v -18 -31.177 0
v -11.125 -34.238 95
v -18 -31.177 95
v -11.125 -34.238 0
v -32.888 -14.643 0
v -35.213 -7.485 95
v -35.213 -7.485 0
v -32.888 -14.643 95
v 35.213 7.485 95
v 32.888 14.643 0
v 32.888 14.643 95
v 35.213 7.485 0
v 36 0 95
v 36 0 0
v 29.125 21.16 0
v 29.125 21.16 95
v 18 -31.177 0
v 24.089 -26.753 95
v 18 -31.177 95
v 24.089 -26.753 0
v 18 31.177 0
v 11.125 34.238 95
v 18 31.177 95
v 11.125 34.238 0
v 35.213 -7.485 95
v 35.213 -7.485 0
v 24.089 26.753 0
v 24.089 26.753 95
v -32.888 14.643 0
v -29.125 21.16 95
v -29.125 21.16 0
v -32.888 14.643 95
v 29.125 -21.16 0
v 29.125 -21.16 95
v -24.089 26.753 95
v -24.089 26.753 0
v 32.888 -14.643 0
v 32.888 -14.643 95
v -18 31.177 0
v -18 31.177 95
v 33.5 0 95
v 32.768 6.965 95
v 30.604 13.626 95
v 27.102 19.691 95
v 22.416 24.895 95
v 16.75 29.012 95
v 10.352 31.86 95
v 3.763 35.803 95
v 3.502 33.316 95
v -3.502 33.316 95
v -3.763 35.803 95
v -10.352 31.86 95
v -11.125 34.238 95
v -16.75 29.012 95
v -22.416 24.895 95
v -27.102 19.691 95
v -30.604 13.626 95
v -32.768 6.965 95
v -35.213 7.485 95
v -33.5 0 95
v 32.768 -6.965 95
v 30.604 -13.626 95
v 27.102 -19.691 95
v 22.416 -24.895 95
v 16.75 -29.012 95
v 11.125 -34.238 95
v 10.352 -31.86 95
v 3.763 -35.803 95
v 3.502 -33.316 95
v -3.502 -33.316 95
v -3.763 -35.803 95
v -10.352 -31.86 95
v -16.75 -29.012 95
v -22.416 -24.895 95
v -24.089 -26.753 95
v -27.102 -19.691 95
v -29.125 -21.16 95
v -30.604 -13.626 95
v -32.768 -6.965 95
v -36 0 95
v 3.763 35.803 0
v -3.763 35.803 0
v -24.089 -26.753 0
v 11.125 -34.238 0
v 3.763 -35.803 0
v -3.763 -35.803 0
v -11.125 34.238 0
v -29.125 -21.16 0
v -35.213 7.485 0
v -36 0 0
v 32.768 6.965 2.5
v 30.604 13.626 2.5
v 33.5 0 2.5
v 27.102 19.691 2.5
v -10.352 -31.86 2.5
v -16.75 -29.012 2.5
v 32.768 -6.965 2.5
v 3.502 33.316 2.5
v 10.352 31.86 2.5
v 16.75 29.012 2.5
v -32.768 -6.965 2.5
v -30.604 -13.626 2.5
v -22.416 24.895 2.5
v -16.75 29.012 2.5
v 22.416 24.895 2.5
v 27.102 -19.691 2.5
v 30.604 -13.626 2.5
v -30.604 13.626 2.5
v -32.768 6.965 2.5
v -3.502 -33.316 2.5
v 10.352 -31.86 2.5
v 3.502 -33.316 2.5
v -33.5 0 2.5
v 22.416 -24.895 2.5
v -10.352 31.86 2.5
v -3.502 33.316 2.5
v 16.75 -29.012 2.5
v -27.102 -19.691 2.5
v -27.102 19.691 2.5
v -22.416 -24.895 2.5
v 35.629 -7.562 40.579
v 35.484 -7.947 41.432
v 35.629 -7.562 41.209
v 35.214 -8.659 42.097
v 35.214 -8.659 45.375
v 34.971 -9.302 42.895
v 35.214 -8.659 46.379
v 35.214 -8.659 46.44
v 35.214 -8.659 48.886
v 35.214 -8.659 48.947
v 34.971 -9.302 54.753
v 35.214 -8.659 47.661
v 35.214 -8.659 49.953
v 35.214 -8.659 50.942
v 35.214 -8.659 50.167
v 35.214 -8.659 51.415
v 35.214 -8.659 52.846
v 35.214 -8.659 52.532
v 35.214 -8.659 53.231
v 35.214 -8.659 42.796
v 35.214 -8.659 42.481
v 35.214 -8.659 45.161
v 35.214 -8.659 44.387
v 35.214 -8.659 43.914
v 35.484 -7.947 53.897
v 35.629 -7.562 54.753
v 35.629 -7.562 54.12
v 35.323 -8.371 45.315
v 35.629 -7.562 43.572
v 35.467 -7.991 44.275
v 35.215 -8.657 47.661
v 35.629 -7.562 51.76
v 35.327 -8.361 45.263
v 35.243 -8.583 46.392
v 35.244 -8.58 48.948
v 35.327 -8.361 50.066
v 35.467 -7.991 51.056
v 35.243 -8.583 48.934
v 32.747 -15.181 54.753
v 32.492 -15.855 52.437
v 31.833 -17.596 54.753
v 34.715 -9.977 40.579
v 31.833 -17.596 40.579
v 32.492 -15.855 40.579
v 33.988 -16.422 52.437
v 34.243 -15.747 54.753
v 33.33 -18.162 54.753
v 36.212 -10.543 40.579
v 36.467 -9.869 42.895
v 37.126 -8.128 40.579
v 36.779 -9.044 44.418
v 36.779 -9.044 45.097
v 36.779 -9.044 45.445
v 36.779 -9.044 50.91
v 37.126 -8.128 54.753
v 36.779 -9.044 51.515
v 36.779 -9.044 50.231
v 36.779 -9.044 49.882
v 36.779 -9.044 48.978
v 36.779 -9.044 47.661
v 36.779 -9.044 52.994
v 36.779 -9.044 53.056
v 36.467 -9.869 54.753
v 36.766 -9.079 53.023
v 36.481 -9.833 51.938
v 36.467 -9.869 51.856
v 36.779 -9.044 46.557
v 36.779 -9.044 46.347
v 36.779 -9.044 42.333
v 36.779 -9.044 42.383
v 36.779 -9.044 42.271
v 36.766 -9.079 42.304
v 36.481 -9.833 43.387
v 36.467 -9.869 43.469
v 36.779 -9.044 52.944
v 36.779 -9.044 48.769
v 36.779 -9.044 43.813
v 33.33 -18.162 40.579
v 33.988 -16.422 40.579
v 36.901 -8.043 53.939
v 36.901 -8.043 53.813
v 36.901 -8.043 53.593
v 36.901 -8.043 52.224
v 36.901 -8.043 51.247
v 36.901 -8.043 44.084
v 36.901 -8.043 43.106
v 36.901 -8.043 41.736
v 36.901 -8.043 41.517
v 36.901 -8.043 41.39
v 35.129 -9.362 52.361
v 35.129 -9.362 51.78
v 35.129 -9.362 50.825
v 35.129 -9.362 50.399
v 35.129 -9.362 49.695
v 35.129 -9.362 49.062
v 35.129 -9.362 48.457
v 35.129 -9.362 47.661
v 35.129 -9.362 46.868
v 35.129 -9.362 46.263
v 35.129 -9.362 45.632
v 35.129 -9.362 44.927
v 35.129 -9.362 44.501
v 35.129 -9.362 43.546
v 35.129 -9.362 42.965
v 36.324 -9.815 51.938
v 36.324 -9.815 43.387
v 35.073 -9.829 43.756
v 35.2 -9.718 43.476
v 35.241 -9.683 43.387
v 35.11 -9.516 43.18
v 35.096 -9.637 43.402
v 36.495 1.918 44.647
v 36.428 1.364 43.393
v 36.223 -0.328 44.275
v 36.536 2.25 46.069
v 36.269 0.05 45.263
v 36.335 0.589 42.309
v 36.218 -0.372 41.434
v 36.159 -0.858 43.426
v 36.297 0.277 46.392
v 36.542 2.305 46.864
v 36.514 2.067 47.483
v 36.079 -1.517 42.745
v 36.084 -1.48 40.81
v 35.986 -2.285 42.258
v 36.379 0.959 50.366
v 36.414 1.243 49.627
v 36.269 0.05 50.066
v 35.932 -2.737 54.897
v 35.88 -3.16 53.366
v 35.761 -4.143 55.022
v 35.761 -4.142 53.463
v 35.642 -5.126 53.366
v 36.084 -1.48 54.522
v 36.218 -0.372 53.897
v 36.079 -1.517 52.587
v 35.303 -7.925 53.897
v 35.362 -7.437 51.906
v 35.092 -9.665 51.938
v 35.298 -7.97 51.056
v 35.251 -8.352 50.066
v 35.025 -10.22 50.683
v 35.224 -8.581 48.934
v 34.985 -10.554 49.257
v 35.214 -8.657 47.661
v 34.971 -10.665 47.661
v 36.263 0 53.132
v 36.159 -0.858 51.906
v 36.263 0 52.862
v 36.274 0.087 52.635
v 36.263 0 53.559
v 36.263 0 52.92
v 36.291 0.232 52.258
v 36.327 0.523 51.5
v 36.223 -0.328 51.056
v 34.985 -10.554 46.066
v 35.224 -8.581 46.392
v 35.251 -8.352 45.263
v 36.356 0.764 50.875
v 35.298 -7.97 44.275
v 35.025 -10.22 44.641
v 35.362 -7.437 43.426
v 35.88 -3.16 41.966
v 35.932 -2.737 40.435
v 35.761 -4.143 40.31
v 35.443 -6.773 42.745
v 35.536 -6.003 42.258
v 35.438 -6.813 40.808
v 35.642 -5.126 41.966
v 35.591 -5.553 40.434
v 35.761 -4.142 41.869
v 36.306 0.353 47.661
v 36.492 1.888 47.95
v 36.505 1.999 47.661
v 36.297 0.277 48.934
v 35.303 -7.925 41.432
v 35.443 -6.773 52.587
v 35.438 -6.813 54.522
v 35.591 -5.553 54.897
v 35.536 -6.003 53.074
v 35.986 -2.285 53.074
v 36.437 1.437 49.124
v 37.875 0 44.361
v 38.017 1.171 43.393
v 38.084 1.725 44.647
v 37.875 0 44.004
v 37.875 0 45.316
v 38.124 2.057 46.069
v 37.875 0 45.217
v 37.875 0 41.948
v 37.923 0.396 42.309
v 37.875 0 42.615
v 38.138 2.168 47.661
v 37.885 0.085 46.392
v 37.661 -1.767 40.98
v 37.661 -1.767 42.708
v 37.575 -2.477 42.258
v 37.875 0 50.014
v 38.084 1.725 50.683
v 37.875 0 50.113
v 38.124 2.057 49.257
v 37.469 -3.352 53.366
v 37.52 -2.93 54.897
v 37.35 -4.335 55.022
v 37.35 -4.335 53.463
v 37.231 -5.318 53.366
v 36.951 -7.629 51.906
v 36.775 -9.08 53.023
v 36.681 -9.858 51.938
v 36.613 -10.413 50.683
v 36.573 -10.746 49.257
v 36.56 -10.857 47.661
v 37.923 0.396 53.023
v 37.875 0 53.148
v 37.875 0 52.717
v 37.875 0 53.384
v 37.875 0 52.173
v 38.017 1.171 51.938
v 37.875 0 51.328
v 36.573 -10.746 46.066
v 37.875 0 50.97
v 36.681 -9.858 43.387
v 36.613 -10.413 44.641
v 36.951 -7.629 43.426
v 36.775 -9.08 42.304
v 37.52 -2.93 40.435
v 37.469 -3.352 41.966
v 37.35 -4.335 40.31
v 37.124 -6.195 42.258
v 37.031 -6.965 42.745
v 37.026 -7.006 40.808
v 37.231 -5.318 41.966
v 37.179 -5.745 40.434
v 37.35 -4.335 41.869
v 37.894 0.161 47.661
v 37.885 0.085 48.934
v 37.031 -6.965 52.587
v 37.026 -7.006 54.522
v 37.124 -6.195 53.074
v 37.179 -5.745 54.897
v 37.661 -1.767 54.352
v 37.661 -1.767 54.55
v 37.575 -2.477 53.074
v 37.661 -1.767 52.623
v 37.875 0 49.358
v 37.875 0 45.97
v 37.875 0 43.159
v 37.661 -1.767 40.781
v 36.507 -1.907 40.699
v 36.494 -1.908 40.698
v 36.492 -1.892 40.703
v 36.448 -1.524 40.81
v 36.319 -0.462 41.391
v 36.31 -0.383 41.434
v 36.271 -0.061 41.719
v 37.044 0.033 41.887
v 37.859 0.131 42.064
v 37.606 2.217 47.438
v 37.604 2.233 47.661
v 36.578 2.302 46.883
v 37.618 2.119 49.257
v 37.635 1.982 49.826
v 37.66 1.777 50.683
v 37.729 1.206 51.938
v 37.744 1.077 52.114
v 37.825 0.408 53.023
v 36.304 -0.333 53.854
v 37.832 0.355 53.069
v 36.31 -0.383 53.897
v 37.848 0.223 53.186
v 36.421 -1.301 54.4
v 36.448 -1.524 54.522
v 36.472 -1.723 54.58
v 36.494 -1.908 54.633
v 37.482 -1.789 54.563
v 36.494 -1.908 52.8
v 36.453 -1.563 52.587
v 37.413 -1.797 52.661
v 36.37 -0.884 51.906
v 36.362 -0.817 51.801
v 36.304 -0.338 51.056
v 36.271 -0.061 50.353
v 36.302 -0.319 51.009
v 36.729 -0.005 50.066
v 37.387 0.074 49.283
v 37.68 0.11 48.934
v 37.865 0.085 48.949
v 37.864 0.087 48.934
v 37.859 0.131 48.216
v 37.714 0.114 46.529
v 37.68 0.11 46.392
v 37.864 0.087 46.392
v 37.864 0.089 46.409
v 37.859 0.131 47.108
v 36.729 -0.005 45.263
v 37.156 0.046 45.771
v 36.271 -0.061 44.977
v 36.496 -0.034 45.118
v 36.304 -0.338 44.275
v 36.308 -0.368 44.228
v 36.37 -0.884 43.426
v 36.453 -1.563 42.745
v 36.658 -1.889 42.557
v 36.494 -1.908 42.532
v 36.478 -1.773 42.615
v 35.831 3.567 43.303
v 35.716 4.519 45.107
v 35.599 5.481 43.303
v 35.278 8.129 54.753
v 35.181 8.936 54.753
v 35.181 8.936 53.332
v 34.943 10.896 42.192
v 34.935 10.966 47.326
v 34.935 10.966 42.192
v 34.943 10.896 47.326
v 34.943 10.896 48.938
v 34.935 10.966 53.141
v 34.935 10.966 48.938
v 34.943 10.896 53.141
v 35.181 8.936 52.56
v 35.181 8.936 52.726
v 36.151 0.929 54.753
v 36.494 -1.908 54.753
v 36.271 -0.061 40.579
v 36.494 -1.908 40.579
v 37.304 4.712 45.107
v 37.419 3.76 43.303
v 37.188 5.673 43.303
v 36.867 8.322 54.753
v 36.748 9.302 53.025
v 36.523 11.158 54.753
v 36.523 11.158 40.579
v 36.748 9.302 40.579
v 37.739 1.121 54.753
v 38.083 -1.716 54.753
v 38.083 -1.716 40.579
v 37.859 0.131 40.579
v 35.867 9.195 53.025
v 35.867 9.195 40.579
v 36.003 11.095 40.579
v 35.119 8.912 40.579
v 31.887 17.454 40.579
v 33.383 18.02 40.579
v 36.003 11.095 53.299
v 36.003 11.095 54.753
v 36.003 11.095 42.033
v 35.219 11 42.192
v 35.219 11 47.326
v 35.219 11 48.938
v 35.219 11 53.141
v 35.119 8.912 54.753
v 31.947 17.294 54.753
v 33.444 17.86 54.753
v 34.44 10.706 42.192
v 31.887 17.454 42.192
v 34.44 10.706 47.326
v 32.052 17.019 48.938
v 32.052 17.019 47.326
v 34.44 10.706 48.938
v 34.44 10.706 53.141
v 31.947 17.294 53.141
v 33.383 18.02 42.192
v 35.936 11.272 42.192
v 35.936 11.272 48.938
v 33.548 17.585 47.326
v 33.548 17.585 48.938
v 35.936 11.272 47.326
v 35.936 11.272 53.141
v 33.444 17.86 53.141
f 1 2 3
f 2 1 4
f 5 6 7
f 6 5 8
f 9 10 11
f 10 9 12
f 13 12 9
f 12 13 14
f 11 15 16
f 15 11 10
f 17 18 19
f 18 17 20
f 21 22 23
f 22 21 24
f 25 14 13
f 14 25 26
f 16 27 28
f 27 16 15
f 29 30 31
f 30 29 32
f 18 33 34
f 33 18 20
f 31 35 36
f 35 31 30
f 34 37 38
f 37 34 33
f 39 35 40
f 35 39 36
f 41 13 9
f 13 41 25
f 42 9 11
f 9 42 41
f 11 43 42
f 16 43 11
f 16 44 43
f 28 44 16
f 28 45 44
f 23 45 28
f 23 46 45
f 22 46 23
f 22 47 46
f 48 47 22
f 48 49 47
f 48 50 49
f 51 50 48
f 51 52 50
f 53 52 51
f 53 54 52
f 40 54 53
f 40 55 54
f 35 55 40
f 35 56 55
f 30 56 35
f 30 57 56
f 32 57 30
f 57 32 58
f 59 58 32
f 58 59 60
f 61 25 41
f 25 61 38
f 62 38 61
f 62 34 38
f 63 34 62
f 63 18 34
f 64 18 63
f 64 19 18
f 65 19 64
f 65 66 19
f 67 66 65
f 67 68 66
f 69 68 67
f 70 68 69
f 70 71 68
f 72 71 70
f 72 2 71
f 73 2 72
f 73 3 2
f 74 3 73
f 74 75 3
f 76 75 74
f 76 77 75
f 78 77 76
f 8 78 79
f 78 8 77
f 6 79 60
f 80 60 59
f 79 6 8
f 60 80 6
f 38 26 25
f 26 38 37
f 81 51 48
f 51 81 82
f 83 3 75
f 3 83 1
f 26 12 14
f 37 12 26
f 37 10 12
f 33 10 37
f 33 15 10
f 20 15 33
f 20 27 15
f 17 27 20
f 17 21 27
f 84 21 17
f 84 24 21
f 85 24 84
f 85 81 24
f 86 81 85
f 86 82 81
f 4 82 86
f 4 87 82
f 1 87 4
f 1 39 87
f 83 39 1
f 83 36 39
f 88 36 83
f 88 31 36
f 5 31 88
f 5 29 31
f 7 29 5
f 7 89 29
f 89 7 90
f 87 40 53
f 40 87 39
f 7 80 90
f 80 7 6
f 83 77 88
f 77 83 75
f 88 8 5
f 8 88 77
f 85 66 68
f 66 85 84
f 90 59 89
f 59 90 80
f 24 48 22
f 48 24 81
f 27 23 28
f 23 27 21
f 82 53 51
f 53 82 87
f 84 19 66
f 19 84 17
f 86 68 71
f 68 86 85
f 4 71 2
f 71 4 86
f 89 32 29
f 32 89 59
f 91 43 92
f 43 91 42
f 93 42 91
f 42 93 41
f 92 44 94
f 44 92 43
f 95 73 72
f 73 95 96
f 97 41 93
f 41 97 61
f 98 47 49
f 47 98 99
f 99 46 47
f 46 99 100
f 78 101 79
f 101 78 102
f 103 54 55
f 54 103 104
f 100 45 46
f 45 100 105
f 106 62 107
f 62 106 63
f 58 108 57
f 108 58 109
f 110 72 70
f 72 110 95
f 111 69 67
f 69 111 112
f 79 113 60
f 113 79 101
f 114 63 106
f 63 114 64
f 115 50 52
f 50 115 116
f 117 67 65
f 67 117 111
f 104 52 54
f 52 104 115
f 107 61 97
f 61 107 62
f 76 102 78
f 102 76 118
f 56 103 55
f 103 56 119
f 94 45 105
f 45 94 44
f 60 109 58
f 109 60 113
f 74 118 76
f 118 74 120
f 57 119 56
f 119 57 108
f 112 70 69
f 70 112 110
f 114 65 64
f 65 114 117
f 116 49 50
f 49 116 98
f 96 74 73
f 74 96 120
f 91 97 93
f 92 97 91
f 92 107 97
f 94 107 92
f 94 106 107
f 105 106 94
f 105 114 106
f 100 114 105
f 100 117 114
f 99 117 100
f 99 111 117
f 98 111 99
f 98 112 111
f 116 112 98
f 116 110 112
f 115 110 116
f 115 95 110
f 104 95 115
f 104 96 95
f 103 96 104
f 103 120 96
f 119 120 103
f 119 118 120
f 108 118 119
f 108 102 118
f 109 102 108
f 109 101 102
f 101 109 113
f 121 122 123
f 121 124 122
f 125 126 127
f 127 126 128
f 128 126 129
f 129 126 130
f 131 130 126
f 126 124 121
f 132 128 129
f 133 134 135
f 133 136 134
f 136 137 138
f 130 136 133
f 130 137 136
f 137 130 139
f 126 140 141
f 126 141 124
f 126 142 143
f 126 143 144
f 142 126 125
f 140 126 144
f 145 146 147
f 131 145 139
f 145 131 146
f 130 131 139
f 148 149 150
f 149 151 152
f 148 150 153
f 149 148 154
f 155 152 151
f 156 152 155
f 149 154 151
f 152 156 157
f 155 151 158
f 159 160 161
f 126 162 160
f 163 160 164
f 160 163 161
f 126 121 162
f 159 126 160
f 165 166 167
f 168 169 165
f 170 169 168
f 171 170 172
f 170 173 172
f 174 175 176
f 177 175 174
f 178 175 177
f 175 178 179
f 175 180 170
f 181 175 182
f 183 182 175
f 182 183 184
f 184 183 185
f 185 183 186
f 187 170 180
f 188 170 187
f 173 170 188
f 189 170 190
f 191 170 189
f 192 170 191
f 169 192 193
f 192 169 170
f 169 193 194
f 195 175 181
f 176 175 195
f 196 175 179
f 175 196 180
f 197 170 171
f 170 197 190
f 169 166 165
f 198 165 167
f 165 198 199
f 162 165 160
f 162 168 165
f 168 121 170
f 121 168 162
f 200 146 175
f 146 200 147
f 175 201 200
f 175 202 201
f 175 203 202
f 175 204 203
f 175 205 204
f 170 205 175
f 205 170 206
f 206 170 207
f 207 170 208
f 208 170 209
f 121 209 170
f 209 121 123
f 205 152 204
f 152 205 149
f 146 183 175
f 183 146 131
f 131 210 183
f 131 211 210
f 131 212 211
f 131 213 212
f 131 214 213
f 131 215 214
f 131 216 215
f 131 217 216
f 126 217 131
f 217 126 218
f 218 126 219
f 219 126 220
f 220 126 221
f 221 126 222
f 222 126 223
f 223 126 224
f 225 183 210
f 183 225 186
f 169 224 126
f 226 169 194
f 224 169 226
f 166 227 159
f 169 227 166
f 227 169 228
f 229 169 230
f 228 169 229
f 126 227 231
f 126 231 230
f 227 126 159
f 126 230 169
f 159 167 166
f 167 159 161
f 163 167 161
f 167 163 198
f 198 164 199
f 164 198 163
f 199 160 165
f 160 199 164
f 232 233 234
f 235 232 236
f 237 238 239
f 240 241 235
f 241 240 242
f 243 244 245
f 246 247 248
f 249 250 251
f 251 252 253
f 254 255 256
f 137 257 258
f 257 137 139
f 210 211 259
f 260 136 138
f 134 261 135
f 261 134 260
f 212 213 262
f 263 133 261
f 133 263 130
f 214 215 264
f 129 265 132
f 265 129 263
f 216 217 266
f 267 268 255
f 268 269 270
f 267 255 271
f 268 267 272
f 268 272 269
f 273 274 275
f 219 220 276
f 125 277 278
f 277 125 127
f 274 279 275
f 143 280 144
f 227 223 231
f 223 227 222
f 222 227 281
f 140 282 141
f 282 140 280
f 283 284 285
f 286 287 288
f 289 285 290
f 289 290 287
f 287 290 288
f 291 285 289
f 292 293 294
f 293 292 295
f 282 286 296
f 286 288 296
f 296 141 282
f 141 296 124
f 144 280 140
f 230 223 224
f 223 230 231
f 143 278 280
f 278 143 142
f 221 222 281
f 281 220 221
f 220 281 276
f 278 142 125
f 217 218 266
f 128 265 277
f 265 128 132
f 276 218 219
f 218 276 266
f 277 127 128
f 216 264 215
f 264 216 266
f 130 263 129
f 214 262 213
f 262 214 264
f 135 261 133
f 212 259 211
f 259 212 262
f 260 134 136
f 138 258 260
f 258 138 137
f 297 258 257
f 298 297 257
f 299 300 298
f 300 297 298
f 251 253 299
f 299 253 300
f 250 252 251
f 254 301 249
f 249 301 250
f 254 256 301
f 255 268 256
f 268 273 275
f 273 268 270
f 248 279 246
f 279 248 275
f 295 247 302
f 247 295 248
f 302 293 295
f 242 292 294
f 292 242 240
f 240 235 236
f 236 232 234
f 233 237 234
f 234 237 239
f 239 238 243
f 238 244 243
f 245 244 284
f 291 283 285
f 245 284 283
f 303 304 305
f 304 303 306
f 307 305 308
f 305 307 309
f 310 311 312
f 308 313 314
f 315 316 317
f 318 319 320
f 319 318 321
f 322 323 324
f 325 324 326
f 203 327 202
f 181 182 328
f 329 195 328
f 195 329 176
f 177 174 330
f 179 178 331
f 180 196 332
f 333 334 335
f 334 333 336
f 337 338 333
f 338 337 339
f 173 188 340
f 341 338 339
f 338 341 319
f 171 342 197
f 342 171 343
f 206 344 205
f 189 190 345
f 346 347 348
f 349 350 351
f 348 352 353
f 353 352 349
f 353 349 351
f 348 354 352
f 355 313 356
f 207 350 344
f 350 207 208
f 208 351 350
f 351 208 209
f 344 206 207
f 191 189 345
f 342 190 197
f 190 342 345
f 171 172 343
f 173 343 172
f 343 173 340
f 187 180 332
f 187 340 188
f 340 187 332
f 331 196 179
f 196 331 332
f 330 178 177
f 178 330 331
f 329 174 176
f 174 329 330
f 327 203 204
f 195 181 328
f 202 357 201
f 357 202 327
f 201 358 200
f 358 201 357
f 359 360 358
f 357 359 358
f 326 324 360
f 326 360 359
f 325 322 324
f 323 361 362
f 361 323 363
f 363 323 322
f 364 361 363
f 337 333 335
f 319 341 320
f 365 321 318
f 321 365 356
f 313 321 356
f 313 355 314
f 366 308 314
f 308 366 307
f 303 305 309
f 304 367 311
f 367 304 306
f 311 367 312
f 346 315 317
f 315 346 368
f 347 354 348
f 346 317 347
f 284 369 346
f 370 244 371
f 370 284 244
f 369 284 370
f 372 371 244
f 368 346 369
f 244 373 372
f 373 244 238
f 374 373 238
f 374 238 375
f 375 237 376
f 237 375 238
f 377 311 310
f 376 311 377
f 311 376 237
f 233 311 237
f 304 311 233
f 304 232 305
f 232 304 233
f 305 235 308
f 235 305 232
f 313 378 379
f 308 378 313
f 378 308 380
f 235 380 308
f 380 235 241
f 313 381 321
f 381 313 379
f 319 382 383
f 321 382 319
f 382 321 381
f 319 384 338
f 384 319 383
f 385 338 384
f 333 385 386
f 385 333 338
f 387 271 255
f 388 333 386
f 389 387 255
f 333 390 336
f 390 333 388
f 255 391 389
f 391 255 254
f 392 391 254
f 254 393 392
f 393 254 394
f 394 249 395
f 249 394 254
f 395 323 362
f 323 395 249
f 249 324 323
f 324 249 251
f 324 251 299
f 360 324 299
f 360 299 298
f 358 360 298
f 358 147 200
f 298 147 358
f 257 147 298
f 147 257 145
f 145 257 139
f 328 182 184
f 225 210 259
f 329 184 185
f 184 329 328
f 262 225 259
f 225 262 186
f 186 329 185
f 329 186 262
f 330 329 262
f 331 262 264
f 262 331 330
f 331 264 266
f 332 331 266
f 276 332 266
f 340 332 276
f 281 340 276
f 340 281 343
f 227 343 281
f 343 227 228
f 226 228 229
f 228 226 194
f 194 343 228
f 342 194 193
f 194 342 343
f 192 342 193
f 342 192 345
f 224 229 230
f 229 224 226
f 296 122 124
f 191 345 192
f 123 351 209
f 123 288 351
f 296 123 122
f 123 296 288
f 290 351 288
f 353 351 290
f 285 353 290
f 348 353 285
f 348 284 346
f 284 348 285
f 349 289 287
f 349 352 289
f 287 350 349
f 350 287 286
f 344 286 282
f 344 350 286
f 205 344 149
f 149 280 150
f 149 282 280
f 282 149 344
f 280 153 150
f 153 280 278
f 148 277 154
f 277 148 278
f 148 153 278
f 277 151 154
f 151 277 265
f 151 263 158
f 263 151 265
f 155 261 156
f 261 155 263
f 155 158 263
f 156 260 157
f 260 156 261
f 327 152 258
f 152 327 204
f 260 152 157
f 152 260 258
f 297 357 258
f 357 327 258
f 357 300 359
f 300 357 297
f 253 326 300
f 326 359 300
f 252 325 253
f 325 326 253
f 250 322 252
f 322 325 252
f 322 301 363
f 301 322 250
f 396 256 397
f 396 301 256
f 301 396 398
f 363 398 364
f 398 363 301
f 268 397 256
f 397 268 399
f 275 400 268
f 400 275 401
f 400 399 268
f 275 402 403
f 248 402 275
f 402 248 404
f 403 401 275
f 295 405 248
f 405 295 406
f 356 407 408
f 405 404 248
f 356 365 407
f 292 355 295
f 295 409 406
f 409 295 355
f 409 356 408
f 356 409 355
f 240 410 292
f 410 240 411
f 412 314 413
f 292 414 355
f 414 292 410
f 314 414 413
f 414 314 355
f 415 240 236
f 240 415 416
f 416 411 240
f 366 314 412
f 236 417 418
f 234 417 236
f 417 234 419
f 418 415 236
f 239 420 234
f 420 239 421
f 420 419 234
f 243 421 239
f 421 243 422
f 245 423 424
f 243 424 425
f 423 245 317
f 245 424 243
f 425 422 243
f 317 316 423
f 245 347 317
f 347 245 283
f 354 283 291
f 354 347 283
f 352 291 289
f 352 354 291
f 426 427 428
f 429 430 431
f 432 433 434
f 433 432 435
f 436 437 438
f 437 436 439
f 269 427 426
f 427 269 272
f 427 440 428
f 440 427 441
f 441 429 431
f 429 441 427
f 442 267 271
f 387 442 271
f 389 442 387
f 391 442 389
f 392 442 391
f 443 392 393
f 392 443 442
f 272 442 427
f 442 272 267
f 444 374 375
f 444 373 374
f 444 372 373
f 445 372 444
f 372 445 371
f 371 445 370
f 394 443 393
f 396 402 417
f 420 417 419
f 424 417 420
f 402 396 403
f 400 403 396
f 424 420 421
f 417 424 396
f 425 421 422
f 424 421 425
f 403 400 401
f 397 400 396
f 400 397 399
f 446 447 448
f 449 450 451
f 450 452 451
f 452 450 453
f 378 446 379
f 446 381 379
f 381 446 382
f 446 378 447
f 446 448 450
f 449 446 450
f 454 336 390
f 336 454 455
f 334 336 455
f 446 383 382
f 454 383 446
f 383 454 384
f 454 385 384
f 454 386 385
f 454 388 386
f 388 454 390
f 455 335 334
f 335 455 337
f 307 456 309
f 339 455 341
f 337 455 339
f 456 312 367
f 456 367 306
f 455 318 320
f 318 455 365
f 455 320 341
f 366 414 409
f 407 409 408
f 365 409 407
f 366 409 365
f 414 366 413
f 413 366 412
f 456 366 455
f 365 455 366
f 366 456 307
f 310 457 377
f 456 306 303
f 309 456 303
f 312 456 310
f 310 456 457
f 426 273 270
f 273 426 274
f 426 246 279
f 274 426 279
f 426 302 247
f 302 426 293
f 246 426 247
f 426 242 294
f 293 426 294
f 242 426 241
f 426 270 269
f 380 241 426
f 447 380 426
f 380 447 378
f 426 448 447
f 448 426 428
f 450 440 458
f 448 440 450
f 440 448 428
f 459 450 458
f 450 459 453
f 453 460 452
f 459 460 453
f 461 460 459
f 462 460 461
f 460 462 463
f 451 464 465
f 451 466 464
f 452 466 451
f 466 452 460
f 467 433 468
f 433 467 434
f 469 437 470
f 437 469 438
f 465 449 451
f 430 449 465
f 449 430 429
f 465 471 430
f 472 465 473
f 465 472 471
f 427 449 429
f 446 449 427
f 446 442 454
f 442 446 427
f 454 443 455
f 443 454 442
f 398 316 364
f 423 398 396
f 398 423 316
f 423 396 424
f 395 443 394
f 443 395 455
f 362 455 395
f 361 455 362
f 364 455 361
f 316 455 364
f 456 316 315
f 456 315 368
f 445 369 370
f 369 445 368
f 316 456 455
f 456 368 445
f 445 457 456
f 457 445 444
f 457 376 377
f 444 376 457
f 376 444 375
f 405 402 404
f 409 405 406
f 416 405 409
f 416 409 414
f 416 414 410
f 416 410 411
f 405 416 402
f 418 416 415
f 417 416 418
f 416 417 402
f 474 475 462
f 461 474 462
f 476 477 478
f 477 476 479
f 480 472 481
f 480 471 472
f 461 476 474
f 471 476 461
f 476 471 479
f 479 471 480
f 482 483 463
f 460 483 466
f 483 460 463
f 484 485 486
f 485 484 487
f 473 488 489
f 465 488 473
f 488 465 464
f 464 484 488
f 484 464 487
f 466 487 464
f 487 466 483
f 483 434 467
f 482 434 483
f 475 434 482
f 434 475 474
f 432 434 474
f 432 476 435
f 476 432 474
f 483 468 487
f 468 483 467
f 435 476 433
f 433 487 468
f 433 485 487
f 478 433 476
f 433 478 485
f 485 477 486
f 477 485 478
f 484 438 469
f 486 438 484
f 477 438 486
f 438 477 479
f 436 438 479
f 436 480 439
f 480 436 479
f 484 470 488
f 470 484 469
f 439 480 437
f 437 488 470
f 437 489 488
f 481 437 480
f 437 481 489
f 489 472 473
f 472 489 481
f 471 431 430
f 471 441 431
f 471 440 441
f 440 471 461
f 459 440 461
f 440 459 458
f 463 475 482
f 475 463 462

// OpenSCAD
// ── COPO PERSONALIZADO PARA DENTES ──
// Parâmetros injetados pelo backend
nome        = is_undef(nome)        ? "NOME"      : nome;
fonte       = is_undef(fonte)       ? "Open Sans" : fonte;
fontSize    = is_undef(fontSize)    ? 14          : fontSize;
diametro    = is_undef(diametro)    ? 72          : diametro;
altura_copo = is_undef(altura_copo) ? 95          : altura_copo;

espessura   = 2.5;
r           = diametro / 2;
altura_rel  = 1.5;   // altura das letras em relevo

// Coloca cada letra rotacionada à volta do cilindro
module texto_cilindrico(str, raio, h_pos, tamanho, fonte) {
    n             = len(str);
    char_width    = tamanho * 0.62;
    angle_per_char = (char_width / raio) * (180 / PI);
    total_angle   = angle_per_char * n;

    for (i = [0 : n - 1]) {
        a = -total_angle / 2 + (i + 0.5) * angle_per_char;
        rotate([0, 0, a])
        translate([raio, 0, h_pos])
        rotate([90, 0, 90])
        linear_extrude(height = altura_rel + 0.1)
        text(str[i], size = tamanho, font = fonte,
             halign = "center", valign = "center");
    }
}

// Corpo do copo (cilindro oco com base reforçada)
difference() {
    union() {
        cylinder(h = altura_copo,        r = r);
        cylinder(h = espessura * 1.5,    r = r); // base reforçada
    }
    translate([0, 0, espessura])
        cylinder(h = altura_copo, r = r - espessura); // interior oco
}

// Texto em relevo a acompanhar a superfície curva
texto_cilindrico(nome, r, altura_copo / 2, fontSize, fonte);
